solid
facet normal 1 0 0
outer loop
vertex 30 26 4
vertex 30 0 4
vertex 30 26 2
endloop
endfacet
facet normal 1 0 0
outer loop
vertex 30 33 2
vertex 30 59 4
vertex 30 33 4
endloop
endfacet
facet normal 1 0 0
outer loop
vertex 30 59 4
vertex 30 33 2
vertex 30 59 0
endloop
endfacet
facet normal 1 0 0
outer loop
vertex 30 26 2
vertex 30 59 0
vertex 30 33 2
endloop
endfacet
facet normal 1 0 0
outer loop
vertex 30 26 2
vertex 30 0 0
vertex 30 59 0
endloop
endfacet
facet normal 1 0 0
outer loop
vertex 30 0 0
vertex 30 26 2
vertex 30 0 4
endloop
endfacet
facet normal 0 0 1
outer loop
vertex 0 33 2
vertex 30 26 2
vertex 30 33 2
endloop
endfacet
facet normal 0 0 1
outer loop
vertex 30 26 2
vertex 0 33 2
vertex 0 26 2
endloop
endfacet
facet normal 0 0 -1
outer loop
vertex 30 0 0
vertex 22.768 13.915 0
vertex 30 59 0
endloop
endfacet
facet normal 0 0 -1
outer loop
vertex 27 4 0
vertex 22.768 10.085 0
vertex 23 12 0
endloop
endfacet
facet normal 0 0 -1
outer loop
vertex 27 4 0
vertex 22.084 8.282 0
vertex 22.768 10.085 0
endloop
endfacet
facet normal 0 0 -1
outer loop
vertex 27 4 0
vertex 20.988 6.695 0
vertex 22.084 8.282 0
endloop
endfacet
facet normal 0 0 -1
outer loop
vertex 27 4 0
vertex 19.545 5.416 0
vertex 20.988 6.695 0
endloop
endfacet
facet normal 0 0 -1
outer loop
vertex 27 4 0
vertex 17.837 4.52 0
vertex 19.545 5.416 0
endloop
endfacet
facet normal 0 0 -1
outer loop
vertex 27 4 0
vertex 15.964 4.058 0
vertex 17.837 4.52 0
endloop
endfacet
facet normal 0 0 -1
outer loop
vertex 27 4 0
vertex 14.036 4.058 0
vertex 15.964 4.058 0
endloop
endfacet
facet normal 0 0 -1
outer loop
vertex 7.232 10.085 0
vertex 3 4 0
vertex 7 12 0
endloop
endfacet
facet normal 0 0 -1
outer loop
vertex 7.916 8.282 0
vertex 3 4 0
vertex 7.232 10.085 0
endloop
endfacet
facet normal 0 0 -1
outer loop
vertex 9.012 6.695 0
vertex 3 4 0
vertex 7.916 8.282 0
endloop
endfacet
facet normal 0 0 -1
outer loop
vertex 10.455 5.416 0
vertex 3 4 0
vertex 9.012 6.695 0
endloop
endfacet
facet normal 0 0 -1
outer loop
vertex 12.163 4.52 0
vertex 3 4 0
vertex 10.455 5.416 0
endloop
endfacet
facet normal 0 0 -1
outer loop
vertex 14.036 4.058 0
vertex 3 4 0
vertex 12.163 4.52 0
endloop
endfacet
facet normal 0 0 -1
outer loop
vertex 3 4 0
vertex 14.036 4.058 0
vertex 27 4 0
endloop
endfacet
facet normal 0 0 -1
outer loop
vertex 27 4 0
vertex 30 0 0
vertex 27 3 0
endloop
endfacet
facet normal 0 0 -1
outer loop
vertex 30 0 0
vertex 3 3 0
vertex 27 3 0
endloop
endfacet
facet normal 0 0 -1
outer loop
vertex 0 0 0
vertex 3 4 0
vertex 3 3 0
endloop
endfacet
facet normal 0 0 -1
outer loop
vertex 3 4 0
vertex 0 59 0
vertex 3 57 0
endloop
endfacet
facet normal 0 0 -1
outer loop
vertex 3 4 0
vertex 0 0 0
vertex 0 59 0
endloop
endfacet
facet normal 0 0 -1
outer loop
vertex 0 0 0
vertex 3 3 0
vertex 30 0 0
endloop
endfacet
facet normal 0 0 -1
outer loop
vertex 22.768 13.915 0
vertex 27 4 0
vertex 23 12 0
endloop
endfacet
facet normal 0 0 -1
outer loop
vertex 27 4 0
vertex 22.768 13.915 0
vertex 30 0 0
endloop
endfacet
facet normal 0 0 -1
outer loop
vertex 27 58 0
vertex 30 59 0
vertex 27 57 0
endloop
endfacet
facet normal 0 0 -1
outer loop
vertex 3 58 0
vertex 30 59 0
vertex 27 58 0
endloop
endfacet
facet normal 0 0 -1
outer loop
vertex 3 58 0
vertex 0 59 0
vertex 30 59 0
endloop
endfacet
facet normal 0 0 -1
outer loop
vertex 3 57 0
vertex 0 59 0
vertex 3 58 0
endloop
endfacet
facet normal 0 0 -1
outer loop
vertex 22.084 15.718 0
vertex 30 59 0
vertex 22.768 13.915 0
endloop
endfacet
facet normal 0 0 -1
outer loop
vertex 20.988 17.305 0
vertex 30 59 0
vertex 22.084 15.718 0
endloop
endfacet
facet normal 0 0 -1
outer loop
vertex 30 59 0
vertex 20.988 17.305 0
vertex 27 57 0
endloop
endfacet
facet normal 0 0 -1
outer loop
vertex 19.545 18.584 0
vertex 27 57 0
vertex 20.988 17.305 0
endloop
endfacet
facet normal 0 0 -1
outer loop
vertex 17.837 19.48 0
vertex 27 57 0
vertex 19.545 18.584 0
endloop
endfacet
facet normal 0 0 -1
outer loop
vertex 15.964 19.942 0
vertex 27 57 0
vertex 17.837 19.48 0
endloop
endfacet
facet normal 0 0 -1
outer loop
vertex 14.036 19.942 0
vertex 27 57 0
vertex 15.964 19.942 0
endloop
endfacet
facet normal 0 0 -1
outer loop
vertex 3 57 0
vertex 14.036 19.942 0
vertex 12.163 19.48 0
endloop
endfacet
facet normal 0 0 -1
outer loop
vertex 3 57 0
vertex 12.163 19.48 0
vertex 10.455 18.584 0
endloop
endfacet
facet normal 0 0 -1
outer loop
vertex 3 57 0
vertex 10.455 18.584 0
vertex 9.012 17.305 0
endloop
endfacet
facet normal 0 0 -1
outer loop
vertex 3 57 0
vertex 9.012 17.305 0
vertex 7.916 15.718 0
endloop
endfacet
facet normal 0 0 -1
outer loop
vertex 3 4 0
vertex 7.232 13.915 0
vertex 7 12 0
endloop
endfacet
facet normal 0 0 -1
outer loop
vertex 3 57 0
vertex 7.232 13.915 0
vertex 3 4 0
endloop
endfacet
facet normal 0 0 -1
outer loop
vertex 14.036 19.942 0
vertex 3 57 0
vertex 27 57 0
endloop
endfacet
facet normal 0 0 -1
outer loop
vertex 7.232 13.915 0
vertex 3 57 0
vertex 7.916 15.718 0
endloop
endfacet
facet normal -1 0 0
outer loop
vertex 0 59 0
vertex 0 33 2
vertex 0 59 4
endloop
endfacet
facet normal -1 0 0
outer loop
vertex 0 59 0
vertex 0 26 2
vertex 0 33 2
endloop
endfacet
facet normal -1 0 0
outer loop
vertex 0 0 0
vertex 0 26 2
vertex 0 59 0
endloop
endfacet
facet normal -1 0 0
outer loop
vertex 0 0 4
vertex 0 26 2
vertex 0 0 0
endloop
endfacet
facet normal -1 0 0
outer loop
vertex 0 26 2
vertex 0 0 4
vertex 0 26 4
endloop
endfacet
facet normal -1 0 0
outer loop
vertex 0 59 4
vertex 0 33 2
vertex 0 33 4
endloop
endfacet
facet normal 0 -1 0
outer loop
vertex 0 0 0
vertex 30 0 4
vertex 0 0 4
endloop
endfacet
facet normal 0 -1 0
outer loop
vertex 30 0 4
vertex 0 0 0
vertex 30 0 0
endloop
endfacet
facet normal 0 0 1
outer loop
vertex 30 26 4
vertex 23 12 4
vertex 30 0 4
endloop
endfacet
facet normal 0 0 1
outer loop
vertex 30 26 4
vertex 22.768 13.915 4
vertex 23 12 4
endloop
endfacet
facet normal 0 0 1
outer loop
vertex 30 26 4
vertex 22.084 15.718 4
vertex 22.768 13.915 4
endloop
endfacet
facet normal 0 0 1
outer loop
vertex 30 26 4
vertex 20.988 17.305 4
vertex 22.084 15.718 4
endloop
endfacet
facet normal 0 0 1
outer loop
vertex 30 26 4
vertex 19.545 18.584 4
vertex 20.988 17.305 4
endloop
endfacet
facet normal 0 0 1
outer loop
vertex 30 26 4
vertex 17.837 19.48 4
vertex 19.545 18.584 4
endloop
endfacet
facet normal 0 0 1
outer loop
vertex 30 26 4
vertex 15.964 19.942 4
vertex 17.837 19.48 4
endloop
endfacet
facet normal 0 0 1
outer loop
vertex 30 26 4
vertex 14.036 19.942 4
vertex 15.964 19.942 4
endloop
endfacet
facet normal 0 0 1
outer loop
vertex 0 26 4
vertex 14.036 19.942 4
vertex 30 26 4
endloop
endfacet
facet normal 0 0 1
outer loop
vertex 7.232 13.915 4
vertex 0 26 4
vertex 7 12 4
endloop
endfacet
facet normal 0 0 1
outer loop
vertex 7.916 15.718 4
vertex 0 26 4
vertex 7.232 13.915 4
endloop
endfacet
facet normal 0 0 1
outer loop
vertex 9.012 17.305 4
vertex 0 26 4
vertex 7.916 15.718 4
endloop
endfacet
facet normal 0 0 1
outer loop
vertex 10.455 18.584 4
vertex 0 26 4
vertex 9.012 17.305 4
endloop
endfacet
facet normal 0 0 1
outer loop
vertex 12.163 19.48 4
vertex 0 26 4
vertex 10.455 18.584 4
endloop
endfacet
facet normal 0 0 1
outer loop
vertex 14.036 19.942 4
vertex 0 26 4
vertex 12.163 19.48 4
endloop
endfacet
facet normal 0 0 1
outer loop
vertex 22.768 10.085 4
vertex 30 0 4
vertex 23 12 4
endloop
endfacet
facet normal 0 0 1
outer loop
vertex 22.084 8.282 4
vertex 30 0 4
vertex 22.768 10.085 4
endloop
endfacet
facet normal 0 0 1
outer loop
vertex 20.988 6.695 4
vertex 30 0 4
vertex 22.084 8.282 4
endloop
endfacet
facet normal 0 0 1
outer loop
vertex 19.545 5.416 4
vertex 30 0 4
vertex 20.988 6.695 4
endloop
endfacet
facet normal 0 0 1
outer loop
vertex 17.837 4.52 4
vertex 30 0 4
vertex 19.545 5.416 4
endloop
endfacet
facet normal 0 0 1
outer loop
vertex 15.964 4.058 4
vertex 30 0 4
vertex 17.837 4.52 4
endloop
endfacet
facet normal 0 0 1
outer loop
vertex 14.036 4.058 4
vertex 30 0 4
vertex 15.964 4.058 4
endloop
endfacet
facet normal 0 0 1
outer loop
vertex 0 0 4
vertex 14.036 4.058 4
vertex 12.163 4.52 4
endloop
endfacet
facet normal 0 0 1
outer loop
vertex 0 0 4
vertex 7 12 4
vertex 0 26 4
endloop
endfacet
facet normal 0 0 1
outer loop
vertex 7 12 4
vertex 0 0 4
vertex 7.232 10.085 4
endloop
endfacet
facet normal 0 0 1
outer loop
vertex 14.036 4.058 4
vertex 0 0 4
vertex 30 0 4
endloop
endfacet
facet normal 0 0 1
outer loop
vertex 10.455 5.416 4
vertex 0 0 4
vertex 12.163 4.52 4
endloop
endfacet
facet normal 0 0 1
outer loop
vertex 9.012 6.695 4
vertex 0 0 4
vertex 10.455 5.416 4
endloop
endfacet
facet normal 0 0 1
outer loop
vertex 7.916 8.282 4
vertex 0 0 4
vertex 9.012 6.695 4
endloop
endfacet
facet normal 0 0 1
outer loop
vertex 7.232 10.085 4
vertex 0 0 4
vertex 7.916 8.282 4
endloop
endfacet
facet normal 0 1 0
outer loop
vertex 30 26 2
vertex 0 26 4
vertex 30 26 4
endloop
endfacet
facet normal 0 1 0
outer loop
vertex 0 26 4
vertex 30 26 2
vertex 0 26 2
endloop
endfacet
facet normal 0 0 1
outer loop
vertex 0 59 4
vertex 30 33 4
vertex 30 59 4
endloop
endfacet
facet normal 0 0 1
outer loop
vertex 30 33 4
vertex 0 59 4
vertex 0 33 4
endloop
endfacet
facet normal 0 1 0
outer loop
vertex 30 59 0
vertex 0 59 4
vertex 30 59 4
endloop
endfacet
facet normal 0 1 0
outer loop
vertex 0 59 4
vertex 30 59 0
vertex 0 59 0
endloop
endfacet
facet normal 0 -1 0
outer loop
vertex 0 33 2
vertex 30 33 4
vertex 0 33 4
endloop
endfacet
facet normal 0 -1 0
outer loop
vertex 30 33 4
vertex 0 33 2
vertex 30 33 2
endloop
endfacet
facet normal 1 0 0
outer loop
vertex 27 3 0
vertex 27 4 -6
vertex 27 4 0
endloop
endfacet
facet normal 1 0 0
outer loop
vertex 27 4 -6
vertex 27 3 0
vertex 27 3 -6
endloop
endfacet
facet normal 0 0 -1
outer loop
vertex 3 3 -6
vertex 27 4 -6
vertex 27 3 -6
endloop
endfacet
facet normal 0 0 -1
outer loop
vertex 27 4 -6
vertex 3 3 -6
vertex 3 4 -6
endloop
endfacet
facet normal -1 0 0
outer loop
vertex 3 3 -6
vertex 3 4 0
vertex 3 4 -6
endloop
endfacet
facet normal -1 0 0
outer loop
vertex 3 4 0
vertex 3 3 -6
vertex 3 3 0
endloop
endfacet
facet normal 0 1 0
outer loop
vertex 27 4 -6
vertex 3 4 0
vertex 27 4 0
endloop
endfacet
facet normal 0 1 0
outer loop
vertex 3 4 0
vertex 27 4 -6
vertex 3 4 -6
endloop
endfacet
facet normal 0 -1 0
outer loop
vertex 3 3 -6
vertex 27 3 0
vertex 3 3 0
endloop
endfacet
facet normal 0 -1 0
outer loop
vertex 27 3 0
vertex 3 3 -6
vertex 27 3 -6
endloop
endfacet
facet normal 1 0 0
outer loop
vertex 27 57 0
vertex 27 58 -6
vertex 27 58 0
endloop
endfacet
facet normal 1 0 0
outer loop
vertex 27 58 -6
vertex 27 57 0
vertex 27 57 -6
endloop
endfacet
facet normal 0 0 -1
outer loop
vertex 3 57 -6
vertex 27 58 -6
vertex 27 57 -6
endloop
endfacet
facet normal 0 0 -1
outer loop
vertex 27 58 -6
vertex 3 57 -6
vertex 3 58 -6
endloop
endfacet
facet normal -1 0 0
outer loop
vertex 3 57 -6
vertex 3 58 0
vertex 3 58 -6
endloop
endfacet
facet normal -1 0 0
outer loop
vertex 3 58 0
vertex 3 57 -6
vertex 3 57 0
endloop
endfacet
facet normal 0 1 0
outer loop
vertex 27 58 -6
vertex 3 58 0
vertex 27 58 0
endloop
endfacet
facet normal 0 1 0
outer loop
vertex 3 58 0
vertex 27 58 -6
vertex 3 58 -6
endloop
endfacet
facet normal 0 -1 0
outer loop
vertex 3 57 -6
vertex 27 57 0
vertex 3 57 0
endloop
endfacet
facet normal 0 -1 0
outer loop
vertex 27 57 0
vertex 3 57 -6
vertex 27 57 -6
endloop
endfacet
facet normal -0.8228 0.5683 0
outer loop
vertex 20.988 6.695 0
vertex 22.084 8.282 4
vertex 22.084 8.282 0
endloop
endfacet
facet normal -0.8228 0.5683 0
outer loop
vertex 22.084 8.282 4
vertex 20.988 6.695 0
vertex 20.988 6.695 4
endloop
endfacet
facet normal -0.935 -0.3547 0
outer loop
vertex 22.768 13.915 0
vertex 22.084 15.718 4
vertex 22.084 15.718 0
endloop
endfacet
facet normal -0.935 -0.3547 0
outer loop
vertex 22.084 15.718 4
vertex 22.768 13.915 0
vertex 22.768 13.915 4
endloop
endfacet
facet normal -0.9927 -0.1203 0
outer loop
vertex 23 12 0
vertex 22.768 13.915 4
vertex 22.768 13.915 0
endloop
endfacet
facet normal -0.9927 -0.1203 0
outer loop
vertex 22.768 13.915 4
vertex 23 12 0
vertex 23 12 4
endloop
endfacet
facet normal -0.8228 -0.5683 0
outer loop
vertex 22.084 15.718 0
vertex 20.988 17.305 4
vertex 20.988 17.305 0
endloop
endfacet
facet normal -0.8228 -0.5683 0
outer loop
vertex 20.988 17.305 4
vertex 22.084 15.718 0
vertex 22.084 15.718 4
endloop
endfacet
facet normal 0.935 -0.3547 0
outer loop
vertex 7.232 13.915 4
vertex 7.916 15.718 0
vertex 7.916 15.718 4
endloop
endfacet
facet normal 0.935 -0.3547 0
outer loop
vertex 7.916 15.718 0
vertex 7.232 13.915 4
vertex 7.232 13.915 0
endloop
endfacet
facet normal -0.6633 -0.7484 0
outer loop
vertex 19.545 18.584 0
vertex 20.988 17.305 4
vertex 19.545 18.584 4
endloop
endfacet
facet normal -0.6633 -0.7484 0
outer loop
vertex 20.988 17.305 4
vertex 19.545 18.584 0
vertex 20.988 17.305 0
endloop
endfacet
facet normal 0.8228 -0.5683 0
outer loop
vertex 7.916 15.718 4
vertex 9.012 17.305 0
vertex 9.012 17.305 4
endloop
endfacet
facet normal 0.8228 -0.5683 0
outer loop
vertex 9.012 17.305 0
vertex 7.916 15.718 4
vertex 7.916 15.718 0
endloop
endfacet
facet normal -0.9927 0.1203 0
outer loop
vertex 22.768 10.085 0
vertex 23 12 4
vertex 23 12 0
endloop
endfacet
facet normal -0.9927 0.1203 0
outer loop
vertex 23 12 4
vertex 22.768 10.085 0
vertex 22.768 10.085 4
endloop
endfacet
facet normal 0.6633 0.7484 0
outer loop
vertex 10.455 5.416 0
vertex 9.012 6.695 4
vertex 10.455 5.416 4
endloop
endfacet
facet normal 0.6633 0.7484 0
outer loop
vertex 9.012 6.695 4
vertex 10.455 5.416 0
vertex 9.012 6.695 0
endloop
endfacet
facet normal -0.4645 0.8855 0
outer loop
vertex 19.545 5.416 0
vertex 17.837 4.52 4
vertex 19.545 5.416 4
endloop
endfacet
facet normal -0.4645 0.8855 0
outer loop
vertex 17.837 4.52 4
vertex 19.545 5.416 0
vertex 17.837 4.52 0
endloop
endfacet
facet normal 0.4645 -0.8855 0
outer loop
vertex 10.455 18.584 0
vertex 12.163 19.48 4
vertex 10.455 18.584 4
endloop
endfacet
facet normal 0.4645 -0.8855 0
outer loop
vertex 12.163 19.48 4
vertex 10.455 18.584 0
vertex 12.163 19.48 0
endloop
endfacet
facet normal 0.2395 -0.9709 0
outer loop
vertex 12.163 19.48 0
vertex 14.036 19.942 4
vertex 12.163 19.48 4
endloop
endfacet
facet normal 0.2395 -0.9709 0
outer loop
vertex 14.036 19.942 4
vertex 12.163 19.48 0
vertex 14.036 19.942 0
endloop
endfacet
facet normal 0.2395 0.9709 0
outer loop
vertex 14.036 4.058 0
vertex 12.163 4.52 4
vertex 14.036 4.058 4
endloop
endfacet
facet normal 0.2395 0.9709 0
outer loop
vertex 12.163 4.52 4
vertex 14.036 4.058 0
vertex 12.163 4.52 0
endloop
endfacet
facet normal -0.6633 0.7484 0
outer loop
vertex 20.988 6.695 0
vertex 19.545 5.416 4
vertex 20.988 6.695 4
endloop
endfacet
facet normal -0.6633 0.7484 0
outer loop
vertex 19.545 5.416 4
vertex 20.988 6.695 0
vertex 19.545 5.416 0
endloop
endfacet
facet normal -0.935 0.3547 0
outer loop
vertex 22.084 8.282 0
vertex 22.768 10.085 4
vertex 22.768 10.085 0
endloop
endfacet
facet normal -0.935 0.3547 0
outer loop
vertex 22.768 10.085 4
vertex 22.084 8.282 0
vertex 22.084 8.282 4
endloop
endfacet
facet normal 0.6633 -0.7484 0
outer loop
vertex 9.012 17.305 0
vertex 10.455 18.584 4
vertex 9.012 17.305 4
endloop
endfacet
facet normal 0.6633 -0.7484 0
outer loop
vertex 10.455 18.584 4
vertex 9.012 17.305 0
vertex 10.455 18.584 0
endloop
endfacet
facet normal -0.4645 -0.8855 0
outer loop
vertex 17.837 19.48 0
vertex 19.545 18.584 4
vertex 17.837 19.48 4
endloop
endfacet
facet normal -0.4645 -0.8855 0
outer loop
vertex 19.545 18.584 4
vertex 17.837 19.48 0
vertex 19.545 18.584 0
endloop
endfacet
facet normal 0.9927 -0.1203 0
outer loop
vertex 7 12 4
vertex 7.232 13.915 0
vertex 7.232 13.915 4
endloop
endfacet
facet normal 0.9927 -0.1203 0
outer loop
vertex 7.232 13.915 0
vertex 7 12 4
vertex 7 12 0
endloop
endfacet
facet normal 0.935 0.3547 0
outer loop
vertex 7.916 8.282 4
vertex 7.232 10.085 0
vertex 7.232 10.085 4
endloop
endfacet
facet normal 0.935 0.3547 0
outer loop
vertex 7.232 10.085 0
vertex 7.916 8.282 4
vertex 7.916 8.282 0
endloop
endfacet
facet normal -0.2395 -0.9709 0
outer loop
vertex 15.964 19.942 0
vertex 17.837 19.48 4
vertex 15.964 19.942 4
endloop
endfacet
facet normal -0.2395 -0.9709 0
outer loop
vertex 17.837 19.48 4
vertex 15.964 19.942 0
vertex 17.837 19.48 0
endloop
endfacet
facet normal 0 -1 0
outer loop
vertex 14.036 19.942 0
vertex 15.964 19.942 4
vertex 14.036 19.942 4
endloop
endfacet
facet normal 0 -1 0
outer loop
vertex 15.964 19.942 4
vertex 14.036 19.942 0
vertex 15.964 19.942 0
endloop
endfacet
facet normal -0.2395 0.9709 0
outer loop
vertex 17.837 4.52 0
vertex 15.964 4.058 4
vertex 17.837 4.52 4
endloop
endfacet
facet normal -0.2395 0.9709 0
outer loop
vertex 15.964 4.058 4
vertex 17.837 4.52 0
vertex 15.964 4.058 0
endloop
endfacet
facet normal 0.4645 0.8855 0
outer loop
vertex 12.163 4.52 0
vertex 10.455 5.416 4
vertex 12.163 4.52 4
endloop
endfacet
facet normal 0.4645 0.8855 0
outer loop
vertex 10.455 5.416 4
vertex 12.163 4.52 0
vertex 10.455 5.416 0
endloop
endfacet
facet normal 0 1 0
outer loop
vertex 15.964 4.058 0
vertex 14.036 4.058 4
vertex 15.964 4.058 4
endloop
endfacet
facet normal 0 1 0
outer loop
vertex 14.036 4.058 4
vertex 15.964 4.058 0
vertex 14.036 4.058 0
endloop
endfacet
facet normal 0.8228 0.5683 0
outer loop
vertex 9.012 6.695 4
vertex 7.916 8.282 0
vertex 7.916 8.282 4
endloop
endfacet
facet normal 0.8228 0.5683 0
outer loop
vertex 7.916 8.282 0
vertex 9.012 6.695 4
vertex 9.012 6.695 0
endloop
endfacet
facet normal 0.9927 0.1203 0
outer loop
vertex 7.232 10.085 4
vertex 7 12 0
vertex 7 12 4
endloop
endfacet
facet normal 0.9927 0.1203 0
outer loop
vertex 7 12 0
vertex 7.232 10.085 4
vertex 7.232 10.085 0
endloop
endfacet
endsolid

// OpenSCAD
// Bottom
if (false)
difference(){
  cube([30, 58, 19]);
  translate([2, 2, -1])
    cube([26, 54, 18]);
  // USB hole
  for (i=[0:5]){
    translate([11-i/2, -1, 15-i])    
      cube([8+i, 40, 1]);
  }
  // Battery hole
  translate([20, 10, 8]){
      cube([15, 10, 7]);
  }  
  // APA102 hole
  translate([7, 56, 7]){
      cube([17, 20, 7]);
  }
}


if (false)
difference(){  
  union(){
    cube([30, 58, 2]);
    translate([15, 0, 0])
    cube([15, 29, 24]);
  }
  translate([12, 2, -1])
    cube([17, 25, 23]);
}

// For button feather wing
if (true)
difference(){  
  union(){
    cube([30, 58, 2]);
    cube([30, 26, 4]);
    translate([0,58-(20+5),0])
      cube([30, 26, 4]);
    // Left wing
    translate([3, 3, -6])
      cube([24, 1, 7]);
    // Right wing
    translate([3, 57, -6])
      cube([24, 1, 7]);
  }
  translate([15, 12, -1])
    cylinder(r1=8, r2=8, 8);
}
